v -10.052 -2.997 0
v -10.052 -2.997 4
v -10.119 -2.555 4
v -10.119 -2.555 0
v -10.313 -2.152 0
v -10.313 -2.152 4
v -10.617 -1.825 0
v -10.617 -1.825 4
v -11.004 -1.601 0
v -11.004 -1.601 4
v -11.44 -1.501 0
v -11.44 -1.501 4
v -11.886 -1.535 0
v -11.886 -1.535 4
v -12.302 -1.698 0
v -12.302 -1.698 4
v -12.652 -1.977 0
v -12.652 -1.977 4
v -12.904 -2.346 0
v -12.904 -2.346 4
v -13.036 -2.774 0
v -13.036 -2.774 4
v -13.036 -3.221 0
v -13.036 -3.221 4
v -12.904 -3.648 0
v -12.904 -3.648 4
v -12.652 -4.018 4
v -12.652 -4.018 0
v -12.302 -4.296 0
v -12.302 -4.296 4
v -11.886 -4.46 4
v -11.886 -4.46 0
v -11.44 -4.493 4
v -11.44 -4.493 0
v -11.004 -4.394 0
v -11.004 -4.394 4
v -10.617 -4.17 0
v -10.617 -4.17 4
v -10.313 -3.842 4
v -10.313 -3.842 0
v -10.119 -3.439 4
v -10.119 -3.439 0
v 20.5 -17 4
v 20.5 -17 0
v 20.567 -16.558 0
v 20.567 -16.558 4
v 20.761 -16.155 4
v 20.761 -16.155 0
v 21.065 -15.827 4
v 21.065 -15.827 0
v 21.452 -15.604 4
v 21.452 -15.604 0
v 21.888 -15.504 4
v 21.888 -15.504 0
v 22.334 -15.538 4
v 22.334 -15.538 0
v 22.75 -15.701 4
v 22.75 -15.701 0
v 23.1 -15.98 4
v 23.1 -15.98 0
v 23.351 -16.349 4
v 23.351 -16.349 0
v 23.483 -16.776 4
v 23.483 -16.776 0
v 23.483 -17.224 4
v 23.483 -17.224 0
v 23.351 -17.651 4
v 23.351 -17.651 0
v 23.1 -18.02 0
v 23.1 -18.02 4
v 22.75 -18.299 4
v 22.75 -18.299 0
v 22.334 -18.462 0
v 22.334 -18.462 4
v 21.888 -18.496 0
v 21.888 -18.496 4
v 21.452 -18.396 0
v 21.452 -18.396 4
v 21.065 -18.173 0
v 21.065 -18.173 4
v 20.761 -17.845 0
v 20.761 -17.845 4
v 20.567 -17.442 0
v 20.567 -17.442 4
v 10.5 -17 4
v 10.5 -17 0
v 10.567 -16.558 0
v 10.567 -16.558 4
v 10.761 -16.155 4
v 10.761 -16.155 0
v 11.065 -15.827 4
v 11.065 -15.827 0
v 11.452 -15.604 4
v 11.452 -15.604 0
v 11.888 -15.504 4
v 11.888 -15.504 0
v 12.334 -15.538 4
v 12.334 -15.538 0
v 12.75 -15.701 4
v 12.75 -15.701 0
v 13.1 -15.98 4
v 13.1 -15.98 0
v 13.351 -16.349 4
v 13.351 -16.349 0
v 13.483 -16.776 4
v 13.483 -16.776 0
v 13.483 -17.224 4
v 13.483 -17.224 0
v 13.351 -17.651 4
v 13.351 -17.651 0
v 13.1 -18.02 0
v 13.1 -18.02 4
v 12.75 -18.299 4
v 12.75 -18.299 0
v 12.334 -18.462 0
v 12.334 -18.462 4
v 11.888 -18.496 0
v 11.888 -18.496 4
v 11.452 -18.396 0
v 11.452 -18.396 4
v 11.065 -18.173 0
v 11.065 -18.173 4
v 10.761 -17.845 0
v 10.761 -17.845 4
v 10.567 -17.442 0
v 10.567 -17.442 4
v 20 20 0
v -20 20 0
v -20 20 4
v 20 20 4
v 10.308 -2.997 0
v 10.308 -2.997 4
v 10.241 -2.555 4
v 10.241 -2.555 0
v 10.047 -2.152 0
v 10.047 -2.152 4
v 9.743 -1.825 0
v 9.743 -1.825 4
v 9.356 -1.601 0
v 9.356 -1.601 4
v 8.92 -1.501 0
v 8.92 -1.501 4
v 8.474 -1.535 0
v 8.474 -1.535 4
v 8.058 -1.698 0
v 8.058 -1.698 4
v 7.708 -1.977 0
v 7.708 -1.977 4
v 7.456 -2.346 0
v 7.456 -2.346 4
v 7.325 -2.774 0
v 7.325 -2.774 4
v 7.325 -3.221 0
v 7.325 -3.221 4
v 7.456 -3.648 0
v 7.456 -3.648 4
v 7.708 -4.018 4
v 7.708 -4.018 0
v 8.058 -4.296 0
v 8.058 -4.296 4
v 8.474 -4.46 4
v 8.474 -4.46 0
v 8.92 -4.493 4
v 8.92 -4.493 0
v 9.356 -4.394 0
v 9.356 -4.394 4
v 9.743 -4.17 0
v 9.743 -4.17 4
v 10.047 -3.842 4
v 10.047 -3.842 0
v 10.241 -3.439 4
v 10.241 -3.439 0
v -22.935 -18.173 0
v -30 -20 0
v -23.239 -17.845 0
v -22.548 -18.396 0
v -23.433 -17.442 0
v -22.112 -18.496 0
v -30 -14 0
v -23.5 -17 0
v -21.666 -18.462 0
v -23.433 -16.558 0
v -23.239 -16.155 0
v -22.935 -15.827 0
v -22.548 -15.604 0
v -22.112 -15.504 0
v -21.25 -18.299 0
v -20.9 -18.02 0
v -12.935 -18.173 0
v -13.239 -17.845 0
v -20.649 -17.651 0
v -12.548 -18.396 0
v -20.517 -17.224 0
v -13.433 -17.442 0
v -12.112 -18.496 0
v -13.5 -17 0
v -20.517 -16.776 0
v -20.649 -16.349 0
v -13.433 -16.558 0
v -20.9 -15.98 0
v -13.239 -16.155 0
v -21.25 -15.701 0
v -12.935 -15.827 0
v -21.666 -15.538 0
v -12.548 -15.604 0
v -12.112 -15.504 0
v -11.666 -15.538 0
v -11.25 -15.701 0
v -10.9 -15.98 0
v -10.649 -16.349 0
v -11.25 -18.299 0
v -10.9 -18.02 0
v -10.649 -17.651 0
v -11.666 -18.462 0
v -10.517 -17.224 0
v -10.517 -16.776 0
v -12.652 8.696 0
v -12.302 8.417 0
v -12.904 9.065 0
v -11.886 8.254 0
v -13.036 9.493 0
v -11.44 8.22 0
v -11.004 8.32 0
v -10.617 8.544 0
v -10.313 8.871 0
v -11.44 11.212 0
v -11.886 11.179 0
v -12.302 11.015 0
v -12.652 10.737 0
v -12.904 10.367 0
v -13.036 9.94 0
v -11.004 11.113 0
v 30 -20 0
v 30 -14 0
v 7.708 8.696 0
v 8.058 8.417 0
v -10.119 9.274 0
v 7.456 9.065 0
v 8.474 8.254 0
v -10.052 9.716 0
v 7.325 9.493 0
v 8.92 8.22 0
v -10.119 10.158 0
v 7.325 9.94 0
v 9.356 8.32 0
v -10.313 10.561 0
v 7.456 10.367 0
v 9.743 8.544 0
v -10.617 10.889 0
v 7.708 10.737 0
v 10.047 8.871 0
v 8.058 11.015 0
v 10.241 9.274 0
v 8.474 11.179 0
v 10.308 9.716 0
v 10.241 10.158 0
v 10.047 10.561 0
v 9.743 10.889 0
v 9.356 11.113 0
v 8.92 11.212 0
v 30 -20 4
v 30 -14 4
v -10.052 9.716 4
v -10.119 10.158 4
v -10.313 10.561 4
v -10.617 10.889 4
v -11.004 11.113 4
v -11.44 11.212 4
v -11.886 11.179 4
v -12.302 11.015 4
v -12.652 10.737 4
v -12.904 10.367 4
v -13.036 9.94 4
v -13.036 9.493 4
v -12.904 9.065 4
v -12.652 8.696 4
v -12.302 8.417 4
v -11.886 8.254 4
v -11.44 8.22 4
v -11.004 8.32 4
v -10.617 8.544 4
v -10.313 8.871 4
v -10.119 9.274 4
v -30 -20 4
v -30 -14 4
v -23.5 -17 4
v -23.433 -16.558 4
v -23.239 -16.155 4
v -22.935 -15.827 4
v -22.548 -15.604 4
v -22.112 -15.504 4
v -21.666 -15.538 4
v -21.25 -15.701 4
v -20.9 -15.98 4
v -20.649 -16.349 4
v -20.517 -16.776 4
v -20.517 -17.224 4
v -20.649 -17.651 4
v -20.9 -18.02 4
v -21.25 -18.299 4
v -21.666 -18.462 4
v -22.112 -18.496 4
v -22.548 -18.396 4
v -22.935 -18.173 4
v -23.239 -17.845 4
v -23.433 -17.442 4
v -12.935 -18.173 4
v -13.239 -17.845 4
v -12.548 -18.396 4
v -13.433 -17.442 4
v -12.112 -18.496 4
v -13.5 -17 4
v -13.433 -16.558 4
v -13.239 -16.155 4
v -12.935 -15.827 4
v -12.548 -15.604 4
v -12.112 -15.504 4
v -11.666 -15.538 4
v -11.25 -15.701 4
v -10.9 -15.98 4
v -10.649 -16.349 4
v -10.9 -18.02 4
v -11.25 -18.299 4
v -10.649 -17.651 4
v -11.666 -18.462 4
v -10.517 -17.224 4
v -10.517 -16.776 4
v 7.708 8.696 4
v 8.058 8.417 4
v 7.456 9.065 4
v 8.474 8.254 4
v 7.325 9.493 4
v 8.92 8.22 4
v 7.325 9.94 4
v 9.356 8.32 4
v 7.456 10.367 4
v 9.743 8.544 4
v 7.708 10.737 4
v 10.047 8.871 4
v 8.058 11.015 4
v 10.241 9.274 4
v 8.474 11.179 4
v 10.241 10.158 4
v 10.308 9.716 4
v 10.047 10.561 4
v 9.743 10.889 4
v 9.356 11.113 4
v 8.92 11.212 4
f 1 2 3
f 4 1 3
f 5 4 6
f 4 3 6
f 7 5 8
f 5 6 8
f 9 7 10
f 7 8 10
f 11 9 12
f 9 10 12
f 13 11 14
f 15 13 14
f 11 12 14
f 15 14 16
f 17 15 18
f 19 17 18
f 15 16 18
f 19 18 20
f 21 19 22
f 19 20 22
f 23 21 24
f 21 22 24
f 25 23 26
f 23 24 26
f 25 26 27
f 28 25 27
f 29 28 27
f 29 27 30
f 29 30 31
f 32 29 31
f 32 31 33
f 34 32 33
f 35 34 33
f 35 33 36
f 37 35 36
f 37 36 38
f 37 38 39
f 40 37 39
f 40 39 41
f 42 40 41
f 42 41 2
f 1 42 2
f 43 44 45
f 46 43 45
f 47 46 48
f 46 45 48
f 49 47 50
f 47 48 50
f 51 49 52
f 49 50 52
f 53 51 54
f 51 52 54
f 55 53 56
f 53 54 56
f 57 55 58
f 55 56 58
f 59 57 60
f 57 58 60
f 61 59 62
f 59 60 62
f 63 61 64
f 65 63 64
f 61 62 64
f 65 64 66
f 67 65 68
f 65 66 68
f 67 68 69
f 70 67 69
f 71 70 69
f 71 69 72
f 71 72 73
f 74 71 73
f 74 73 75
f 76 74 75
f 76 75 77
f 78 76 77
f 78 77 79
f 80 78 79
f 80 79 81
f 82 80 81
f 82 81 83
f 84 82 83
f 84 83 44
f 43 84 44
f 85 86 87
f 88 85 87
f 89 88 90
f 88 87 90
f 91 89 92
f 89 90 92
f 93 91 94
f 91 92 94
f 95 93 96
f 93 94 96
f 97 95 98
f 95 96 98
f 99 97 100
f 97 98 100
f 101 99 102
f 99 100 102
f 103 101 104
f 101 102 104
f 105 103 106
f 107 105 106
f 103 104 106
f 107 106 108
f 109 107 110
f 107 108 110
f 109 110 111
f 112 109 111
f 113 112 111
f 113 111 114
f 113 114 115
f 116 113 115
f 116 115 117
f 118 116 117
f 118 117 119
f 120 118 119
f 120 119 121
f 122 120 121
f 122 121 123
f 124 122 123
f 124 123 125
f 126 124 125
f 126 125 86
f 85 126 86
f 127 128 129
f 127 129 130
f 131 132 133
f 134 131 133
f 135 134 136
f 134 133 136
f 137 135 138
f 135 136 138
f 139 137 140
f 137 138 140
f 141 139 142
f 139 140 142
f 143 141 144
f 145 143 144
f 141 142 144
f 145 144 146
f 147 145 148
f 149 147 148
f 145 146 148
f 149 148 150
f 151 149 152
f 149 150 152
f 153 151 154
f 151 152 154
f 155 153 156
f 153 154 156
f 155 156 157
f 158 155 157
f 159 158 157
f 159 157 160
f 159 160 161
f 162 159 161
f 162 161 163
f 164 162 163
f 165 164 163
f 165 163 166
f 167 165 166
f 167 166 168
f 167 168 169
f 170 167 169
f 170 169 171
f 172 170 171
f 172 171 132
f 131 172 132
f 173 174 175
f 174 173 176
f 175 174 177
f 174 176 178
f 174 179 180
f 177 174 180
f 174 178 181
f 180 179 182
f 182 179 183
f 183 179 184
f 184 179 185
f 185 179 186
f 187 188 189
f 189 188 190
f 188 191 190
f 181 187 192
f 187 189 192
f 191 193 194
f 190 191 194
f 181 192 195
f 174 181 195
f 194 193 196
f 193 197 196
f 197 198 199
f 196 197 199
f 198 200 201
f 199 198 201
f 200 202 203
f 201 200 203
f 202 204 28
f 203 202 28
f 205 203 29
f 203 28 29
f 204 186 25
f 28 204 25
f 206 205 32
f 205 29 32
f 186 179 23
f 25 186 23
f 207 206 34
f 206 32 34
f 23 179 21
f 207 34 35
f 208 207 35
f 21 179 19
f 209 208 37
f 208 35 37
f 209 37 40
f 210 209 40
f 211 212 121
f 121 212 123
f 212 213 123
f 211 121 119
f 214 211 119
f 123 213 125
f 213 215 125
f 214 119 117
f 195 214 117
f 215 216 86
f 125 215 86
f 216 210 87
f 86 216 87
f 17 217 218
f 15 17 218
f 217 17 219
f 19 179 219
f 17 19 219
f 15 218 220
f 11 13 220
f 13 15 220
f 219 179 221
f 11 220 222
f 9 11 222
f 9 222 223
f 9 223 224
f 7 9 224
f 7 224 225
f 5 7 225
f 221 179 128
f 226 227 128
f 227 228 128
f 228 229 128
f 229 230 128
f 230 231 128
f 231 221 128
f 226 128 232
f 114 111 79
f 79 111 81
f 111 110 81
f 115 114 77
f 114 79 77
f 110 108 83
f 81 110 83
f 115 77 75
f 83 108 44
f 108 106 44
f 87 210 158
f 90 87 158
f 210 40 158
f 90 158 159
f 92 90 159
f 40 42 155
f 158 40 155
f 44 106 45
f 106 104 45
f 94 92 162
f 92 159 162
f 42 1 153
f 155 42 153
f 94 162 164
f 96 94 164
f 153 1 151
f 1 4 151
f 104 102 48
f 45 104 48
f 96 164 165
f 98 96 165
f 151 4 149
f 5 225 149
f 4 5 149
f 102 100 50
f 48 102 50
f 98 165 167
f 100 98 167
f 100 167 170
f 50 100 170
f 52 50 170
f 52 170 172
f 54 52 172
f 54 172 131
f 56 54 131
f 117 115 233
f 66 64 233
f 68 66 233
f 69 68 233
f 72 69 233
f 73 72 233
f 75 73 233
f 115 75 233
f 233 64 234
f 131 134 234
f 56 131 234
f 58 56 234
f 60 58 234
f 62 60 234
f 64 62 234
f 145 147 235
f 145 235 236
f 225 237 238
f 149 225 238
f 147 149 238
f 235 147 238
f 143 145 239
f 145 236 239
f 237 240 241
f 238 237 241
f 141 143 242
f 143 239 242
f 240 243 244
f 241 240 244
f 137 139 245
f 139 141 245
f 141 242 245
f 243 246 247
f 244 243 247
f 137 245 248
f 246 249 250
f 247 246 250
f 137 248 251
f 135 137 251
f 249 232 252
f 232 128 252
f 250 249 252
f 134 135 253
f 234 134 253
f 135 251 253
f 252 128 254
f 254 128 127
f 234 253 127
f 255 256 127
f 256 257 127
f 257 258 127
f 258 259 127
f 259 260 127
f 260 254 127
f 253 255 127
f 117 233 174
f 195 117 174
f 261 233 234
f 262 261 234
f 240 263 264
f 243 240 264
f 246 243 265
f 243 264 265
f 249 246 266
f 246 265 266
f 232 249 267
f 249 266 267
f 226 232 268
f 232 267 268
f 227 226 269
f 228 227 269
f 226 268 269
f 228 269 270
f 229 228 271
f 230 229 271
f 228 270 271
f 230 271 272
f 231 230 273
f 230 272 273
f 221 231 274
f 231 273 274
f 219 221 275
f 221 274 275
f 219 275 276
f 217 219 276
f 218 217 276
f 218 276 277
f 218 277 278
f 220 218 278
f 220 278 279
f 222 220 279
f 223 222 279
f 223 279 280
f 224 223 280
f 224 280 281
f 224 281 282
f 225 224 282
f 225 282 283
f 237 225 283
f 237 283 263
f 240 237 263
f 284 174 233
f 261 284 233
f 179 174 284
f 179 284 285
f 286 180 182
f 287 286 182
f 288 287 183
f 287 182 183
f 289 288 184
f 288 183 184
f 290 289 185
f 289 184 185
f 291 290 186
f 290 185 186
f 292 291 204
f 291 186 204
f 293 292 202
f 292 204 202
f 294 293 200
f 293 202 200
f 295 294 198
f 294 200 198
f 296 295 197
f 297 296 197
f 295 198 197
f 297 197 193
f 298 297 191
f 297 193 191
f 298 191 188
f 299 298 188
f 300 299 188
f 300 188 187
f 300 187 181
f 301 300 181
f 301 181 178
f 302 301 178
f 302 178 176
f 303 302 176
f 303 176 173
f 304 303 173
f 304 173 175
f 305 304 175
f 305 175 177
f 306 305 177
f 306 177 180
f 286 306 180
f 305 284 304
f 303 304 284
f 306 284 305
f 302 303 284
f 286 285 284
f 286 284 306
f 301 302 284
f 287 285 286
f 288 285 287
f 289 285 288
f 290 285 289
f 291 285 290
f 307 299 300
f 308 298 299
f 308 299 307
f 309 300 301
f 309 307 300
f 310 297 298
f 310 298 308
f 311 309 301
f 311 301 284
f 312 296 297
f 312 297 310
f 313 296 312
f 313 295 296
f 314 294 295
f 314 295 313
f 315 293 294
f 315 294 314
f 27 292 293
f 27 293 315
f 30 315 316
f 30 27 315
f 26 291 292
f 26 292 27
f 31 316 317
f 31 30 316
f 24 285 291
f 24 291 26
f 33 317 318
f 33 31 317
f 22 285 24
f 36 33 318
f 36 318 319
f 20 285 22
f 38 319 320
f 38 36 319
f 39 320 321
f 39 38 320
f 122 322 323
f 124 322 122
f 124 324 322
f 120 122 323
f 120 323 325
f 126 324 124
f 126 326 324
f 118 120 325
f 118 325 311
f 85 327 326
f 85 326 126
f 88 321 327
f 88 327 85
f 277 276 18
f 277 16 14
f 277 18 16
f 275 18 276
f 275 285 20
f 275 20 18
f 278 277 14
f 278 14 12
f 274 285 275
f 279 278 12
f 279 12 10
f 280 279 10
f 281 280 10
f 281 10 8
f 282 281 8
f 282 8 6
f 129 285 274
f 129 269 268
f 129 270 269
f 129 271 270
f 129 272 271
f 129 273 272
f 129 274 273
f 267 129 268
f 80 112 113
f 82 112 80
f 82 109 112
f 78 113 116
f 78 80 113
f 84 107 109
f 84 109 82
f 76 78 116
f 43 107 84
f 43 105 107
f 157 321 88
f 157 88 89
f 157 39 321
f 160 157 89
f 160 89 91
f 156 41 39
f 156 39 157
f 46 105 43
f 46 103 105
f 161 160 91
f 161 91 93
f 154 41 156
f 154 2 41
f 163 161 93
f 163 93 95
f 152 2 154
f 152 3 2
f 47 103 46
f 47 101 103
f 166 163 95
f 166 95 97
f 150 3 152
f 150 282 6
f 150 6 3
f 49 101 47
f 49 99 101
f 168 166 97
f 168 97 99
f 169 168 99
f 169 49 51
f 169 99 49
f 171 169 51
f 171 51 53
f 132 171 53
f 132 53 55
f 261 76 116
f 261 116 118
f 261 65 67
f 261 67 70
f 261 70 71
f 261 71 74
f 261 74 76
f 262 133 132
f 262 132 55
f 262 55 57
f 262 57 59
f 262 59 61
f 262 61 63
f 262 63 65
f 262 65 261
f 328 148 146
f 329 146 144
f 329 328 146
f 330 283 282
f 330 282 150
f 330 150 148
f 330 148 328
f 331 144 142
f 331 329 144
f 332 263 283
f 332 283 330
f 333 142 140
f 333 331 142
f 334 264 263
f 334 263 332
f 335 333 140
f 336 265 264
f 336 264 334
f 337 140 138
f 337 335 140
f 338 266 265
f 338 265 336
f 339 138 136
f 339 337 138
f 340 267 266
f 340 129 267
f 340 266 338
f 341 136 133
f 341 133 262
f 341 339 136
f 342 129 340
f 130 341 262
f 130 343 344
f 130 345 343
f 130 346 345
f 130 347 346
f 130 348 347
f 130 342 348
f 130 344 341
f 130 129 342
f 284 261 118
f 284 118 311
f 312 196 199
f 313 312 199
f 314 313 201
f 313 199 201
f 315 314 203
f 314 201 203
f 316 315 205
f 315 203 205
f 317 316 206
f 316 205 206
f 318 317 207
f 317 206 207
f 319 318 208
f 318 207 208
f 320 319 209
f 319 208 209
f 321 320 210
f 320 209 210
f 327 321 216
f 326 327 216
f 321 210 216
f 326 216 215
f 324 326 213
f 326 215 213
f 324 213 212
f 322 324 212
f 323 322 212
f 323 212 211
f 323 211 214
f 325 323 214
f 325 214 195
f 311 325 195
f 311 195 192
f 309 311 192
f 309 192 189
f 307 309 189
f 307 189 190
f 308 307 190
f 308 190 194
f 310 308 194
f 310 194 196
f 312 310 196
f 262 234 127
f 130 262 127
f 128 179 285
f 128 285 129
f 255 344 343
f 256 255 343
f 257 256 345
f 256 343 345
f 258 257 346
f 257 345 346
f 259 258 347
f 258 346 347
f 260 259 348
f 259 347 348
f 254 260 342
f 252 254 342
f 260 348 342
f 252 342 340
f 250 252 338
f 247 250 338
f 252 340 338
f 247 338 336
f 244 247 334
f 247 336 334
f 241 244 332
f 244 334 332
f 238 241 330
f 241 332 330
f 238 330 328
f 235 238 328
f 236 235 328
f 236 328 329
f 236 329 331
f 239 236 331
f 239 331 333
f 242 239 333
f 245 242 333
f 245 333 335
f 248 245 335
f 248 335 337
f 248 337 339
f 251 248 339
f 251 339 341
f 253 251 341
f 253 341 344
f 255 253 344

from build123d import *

# Parameters (mm, degrees)
SKETCH_1_W               = 60
SKETCH_1_H               = 40
EXTRUDE_1_DEPTH          = 4
CUT_EXTRUDE_1_DEPTH      = 37.276714294
CUT_EXTRUDE_1_DEPTH_BACK = 4
SKETCH_4_R               = 1.5
CUT_EXTRUDE_2_DEPTH      = 10
SKETCH_5_R               = 1.5
CUT_EXTRUDE_3_DEPTH      = 23


with BuildPart() as part:
    # 草图1 → 凸台-拉伸1 (new body)
    with BuildSketch(Plane.XY):
        Rectangle(SKETCH_1_W, SKETCH_1_H)
    extrude(amount=EXTRUDE_1_DEPTH)

    # 草图3 → 切除-拉伸1 (cut, two sides: drawn at the far end of the back side and taken through both)
    with BuildSketch(Plane.XY.offset(4).offset(-CUT_EXTRUDE_1_DEPTH_BACK)):
        Polygon((-30, -14), (-20, 20), (-34.139231405, 23.424173554), (-38.463694215, 14.486950413), (-35.628768595, 5.021181818), (-34.139231405, -14), align=None)
        Polygon((35.628768595, 5.021181818), (34.139231405, -14), (30, -14), (20, 20), (34.139231405, 23.424173554), (38.463694215, 14.486950413), align=None)
    extrude(amount=CUT_EXTRUDE_1_DEPTH + CUT_EXTRUDE_1_DEPTH_BACK, mode=Mode.SUBTRACT)

    # 草图4 → 切除-拉伸2 (cut)
    with BuildSketch(Plane(origin=(0, 0, 0), x_dir=(-1, 0, 0), z_dir=(0, 0, -1))):
        with Locations((22, -17)):
            Circle(SKETCH_4_R)
        with Locations((12, -17)):
            Circle(SKETCH_4_R)
        with Locations((-12, -17)):
            Circle(SKETCH_4_R)
        with Locations((-22, -17)):
            Circle(SKETCH_4_R)
    extrude(amount=-CUT_EXTRUDE_2_DEPTH, mode=Mode.SUBTRACT)

    # 草图5 → 切除-拉伸3 (cut)
    with BuildSketch(Plane.XY.offset(4)):
        with Locations((-11.552312048, -2.99728939)):
            Circle(SKETCH_5_R)
        with Locations((-11.552312048, 9.716256449)):
            Circle(SKETCH_5_R)
        with Locations((8.807786724, -2.99728939)):
            Circle(SKETCH_5_R)
        with Locations((8.807786724, 9.716256449)):
            Circle(SKETCH_5_R)
    extrude(amount=-CUT_EXTRUDE_3_DEPTH, mode=Mode.SUBTRACT)


solid = part.part
